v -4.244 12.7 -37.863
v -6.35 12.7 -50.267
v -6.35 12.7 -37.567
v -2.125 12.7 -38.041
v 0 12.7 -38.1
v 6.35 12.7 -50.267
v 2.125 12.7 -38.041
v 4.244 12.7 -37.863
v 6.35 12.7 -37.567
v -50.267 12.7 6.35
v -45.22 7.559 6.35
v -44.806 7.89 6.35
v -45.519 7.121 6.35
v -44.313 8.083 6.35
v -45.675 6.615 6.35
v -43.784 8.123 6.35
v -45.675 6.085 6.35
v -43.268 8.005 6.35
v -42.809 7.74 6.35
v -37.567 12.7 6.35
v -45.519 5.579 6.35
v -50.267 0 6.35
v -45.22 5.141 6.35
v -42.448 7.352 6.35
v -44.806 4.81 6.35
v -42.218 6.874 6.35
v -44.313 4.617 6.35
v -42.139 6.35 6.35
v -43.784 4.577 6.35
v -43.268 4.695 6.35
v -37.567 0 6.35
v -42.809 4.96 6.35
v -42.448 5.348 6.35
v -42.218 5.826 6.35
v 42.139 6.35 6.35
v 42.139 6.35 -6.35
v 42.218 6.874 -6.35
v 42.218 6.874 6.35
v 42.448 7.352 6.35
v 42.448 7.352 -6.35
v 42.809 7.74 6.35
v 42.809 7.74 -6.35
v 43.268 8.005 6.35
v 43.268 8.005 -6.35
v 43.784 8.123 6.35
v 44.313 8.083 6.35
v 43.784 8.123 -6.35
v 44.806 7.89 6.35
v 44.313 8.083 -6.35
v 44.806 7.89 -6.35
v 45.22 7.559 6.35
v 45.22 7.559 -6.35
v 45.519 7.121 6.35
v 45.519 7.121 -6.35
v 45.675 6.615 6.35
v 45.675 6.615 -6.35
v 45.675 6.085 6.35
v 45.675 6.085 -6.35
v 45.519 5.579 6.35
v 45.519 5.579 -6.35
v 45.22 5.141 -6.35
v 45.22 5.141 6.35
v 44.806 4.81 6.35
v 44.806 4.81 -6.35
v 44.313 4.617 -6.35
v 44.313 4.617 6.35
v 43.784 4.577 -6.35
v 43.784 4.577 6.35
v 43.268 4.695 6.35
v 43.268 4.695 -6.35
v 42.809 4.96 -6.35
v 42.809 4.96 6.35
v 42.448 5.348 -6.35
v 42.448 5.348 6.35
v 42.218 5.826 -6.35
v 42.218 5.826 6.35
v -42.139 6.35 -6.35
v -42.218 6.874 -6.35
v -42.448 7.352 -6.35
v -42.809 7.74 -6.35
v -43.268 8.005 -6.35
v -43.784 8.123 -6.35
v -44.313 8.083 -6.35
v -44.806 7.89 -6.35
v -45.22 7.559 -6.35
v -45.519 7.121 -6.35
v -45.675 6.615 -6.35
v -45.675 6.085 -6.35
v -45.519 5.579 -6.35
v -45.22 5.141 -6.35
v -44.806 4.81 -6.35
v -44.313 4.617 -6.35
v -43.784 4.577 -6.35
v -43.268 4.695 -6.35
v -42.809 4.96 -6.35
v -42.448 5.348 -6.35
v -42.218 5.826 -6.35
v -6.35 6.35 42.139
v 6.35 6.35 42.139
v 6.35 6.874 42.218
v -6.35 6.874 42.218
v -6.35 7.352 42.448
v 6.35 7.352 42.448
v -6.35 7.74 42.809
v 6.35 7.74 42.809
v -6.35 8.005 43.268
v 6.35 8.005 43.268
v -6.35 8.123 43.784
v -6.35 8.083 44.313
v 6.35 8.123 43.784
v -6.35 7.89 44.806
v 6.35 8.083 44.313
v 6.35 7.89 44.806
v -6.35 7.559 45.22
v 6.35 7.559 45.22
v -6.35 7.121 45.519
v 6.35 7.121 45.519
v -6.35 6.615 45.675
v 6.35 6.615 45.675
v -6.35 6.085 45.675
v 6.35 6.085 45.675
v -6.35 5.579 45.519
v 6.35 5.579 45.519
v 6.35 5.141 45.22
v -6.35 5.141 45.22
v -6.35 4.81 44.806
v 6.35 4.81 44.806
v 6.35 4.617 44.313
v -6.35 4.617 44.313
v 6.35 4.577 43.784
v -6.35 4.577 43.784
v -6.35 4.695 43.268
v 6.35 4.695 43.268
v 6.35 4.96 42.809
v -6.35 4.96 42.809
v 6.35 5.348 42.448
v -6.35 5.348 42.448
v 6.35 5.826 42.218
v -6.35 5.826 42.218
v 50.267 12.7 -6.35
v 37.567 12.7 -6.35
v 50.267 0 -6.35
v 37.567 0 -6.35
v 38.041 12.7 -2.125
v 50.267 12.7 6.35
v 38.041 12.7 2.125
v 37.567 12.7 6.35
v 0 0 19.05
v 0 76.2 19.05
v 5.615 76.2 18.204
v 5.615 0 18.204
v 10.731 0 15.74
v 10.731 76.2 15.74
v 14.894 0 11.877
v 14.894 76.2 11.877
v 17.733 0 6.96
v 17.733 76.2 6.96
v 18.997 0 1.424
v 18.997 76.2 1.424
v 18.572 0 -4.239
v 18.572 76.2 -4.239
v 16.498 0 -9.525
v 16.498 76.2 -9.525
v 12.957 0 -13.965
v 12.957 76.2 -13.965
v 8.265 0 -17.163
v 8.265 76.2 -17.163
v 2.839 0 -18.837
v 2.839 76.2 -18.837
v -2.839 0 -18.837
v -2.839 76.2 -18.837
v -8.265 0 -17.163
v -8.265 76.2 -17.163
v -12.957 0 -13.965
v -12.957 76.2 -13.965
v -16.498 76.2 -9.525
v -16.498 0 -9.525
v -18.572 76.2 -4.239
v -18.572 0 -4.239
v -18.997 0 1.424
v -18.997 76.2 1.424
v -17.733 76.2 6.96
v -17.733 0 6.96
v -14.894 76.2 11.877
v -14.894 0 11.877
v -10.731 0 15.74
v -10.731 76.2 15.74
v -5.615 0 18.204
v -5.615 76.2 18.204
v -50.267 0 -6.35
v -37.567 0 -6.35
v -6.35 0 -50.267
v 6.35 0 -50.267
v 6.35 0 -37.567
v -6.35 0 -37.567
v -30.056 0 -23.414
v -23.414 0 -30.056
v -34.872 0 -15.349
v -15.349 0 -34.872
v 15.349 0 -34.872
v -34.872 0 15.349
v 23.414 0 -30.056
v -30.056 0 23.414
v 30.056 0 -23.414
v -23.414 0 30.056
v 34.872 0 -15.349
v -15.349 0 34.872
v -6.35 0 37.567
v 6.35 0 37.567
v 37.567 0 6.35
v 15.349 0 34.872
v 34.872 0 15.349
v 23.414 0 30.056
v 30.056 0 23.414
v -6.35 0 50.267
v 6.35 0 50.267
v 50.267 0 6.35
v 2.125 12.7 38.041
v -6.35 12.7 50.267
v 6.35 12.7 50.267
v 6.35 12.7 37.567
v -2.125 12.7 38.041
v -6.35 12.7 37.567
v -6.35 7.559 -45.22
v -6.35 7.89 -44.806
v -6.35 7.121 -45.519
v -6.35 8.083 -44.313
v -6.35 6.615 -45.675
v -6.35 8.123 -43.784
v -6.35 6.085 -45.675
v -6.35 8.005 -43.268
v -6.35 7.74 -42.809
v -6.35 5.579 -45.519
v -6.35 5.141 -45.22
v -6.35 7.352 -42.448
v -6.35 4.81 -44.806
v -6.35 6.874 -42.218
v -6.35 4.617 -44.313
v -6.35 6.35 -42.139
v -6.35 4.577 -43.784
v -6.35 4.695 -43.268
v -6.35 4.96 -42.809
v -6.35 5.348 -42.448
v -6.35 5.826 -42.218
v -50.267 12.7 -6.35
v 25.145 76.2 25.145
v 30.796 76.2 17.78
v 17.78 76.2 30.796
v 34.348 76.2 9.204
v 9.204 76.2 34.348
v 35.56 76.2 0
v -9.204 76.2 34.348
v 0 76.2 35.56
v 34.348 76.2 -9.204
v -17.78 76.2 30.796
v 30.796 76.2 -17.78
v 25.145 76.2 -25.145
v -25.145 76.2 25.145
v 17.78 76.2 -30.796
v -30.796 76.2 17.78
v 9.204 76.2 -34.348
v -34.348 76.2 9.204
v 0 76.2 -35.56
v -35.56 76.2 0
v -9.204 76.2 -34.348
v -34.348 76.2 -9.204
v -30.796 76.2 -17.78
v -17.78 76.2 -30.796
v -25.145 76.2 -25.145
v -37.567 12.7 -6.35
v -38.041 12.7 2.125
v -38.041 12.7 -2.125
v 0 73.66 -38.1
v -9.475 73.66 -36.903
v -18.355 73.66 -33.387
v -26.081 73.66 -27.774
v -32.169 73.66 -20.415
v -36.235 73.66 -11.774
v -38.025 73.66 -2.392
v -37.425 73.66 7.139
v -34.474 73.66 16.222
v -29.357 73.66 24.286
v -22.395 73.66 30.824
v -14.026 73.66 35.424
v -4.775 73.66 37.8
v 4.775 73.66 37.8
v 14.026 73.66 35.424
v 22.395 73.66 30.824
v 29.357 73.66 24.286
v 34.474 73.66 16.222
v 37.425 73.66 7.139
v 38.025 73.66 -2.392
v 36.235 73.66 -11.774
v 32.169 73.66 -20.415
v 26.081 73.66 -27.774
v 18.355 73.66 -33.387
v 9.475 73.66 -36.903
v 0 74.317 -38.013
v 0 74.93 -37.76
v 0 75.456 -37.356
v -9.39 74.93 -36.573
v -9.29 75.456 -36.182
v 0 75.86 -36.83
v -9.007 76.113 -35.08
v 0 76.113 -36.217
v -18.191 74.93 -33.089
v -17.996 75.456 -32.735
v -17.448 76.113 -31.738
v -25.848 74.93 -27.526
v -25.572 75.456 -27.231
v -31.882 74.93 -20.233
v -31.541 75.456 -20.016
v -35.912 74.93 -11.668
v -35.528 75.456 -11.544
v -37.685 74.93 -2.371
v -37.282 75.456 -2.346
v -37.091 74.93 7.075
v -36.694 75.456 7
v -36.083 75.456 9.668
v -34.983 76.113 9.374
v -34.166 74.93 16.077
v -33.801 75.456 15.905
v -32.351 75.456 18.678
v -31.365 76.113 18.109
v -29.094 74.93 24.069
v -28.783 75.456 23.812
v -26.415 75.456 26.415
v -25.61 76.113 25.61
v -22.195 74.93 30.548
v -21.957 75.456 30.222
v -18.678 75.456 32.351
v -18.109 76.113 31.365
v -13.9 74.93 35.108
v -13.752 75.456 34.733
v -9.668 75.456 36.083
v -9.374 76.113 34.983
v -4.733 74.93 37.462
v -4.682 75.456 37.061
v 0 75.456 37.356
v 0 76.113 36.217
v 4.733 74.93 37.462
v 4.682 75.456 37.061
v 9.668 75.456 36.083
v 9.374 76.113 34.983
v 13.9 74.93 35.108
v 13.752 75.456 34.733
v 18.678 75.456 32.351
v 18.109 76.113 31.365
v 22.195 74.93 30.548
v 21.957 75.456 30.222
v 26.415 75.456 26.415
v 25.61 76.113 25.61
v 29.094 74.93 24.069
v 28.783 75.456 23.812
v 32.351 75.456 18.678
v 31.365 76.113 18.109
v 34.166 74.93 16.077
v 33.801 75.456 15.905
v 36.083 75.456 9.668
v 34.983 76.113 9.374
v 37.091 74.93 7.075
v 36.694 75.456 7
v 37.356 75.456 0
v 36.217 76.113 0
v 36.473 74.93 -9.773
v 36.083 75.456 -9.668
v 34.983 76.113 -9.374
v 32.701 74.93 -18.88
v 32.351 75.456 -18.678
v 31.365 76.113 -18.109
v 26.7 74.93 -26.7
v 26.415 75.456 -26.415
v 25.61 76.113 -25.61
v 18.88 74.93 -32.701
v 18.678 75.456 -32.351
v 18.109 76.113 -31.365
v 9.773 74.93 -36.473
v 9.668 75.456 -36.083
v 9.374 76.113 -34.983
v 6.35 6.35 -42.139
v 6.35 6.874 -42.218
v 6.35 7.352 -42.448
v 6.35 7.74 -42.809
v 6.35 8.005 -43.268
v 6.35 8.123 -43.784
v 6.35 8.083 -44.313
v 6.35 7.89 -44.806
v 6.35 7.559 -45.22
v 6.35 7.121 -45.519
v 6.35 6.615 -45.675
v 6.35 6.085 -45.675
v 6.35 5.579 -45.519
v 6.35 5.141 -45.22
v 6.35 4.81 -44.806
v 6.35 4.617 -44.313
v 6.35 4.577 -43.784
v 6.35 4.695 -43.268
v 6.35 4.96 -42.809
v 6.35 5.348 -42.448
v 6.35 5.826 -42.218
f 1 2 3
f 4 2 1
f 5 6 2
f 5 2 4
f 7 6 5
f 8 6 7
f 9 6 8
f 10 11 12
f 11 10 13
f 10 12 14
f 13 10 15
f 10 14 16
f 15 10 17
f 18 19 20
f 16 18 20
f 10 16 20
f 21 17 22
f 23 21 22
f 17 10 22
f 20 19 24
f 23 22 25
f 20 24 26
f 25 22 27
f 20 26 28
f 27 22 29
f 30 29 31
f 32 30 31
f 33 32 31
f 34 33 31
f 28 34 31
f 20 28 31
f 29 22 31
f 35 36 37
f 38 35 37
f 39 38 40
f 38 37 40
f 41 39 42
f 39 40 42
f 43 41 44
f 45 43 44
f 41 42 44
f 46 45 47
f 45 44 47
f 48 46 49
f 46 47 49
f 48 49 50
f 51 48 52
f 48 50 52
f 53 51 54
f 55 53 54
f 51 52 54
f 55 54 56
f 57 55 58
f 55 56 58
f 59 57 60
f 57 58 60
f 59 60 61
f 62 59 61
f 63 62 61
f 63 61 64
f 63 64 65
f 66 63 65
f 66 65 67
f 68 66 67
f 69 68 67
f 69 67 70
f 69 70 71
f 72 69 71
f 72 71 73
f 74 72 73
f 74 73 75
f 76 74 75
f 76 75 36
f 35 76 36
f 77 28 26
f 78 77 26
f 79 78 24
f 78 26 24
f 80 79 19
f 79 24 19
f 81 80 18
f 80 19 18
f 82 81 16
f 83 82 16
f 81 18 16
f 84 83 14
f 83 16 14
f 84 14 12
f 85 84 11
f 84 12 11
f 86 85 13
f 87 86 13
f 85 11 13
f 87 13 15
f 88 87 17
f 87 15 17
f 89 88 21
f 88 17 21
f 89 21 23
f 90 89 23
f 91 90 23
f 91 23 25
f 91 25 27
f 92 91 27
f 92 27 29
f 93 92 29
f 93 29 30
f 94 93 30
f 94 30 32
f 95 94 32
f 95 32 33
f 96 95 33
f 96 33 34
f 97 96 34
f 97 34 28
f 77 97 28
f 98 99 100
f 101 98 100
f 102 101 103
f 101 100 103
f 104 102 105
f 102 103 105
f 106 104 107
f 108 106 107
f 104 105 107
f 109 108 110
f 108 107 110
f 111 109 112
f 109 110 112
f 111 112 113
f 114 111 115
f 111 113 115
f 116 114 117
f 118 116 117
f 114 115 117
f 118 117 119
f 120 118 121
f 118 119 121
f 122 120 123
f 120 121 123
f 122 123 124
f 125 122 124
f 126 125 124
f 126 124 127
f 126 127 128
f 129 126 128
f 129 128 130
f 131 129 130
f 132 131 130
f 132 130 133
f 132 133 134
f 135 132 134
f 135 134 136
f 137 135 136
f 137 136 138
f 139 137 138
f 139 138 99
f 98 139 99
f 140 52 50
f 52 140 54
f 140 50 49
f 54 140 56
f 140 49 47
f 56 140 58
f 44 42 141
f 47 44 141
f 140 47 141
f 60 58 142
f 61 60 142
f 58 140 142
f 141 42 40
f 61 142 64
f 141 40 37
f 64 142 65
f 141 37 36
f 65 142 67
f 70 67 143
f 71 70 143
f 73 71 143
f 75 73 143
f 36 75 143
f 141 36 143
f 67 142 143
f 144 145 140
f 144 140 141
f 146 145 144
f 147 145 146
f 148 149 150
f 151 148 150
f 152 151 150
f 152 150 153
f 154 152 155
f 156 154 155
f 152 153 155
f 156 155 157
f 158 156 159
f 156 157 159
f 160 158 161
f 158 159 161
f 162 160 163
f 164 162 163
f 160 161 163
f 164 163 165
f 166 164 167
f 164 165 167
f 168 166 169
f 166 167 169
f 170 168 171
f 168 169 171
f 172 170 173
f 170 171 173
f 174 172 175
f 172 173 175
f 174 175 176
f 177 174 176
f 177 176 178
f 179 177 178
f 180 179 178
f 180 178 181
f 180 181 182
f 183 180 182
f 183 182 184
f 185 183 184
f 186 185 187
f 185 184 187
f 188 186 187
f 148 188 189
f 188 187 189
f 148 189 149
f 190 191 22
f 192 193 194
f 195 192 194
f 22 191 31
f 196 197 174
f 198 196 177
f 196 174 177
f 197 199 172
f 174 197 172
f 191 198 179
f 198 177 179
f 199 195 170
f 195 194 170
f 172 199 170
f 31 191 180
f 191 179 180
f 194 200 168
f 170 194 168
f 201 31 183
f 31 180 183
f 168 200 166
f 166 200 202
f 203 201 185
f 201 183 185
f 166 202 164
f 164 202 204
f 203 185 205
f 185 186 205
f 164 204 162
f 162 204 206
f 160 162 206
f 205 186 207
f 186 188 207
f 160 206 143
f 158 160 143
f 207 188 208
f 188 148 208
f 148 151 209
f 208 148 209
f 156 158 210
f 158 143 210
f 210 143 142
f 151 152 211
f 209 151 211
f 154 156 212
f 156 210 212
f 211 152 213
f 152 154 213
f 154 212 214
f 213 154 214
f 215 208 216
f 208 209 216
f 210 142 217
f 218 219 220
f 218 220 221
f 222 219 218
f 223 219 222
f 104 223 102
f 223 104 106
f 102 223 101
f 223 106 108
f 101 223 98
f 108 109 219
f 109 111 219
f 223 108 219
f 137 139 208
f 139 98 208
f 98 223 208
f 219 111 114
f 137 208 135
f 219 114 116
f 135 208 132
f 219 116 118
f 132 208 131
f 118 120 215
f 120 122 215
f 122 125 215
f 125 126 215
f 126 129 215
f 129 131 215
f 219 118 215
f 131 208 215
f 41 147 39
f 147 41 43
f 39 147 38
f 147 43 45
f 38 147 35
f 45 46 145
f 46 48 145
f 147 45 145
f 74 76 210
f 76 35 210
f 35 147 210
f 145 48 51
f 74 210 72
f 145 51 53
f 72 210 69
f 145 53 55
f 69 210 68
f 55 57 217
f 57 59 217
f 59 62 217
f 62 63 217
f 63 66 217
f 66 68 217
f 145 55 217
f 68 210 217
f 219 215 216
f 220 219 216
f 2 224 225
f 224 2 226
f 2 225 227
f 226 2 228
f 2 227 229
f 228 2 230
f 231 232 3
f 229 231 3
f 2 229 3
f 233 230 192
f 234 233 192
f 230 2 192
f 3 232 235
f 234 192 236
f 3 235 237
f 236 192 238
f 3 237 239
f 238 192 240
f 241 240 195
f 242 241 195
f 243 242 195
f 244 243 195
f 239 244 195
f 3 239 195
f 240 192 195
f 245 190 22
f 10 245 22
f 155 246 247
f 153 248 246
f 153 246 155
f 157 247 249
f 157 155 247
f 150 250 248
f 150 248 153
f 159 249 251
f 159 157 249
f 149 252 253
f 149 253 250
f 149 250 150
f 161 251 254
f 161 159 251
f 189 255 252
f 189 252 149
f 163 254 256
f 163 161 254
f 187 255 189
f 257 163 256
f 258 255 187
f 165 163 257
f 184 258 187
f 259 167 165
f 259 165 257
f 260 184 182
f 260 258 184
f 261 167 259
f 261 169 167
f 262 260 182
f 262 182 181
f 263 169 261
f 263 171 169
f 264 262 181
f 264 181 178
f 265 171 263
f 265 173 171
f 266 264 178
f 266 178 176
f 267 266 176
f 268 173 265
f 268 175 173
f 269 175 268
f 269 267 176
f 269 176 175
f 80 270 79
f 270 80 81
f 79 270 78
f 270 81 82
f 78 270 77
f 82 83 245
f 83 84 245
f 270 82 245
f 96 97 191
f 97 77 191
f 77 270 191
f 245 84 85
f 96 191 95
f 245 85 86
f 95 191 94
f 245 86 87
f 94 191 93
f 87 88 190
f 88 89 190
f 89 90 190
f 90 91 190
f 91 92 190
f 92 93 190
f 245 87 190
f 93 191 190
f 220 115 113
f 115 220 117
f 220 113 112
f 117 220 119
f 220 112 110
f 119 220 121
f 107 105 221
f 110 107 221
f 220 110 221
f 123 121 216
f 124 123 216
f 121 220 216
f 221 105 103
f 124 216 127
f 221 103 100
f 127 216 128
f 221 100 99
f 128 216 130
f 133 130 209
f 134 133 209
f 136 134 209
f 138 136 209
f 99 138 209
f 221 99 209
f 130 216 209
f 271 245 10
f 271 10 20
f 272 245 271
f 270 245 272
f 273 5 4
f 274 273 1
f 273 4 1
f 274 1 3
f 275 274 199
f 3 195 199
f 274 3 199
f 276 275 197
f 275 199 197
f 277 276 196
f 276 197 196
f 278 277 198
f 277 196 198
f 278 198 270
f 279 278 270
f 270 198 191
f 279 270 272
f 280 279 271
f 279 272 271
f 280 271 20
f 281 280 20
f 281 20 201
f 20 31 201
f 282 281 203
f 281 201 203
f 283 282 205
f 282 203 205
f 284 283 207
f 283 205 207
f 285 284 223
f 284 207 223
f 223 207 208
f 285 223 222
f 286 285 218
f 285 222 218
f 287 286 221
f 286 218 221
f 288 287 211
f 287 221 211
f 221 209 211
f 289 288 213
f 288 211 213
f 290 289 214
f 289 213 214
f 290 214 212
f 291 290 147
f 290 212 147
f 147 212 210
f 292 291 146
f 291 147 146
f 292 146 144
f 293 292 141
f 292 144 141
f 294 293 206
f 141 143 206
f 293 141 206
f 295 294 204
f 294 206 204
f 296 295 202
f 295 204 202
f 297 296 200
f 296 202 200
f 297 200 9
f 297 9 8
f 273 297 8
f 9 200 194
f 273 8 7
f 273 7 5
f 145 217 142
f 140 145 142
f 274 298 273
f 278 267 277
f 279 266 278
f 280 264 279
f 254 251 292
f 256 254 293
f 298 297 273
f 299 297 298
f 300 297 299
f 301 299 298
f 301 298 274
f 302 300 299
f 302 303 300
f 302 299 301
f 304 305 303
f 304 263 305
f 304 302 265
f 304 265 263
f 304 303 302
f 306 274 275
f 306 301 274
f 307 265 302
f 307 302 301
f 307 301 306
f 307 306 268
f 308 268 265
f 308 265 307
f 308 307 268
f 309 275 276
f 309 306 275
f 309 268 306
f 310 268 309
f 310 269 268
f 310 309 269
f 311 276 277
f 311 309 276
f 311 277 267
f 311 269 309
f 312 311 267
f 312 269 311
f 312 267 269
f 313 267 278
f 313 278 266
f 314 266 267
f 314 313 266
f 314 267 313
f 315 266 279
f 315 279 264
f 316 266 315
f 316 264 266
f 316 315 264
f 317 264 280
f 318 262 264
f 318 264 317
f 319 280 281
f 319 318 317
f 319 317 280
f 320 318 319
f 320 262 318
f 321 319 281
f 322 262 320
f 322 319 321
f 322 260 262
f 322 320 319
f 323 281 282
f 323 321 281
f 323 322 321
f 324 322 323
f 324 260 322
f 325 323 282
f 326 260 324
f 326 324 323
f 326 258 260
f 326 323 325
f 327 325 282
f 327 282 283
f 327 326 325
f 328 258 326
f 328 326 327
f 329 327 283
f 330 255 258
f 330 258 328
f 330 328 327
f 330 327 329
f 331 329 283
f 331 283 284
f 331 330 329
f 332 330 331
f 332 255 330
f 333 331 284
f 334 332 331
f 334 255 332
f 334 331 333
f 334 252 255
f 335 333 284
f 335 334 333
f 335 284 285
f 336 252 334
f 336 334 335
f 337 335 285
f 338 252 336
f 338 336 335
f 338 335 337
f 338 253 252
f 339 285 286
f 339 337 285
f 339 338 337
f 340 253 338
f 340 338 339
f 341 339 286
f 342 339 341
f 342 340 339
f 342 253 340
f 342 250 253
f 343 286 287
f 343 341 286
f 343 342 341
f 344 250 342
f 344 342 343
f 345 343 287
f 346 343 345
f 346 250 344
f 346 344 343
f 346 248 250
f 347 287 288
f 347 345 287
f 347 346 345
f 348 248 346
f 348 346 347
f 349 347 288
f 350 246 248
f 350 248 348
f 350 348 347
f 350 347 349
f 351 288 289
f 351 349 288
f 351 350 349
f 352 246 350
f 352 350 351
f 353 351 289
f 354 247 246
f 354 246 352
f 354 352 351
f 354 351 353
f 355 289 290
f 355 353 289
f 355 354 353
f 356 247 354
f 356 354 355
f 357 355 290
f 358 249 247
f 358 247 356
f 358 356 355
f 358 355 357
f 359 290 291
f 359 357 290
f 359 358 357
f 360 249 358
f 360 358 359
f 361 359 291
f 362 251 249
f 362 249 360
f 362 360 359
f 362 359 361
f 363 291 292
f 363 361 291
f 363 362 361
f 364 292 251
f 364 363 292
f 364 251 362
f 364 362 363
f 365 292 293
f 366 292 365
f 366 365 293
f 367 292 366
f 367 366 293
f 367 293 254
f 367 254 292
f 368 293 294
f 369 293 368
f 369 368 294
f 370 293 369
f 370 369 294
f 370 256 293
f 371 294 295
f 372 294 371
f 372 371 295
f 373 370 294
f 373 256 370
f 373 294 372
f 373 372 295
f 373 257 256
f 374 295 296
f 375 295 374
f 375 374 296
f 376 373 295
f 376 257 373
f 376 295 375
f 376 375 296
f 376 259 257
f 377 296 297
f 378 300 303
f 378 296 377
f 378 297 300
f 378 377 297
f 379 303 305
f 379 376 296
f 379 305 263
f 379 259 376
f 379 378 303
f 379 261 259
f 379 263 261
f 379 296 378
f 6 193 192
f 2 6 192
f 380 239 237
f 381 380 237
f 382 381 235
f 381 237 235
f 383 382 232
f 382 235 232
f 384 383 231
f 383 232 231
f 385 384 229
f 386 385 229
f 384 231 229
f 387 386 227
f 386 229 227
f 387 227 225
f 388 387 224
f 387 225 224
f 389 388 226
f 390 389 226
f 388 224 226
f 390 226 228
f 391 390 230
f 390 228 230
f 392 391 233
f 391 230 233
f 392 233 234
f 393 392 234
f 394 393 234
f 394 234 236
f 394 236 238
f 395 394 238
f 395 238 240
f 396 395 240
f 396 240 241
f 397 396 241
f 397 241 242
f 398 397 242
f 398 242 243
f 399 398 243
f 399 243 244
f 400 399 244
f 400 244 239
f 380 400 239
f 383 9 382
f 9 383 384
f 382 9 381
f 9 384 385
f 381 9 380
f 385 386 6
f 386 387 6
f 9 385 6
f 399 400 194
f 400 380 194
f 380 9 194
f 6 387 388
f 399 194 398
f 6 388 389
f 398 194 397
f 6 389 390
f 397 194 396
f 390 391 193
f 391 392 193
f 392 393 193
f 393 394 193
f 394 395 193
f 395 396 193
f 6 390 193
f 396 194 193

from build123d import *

# Parameters (mm, degrees)
SKETCH2_R           = 38.1
BOSS_EXTRUDE1_DEPTH = 76.2
SKETCH3_R           = 19.05
CUT_EXTRUDE1_DEPTH  = 76.2
FILLET1_R           = 2.54
BOSS_EXTRUDE2_DEPTH = 12.7
SKETCH5_R           = 1.778
CUT_EXTRUDE2_DEPTH  = 25.4
CIRPATTERN2_COUNT   = 4


with BuildPart() as part:
    # Sketch2 → Boss-Extrude1 (new body)
    with BuildSketch(Plane(origin=(0, 0, 0), x_dir=(1, 0, 0), z_dir=(0, 1, 0))):
        with Locations(Location((0, 0, 0), (0, 0, 90))):
            Circle(SKETCH2_R)
    extrude(amount=BOSS_EXTRUDE1_DEPTH)

    # Sketch3 → Cut-Extrude1 (cut)
    with BuildSketch(Plane(origin=(0, 76.2, 0), x_dir=(1, 0, 0), z_dir=(0, 1, 0))):
        with Locations(Location((0, 0, 0), (0, 0, 270))):
            Circle(SKETCH3_R)
    extrude(amount=-CUT_EXTRUDE1_DEPTH, mode=Mode.SUBTRACT)

    # Fillet1
    fillet1_edges = [part.edges().sort_by_distance(p)[0] for p in [
        (0, 76.2, 38.1),
    ]]
    fillet(fillet1_edges, radius=FILLET1_R)

    # Sketch4 → Boss-Extrude2 (add)
    with BuildSketch(Plane(origin=(0, 0, 0), x_dir=(1, 0, 0), z_dir=(0, 1, 0))):
        with BuildLine():
            Line((-37.567106623, 6.35), (-50.267106623, 6.35))
            Line((-50.267106623, 6.35), (-50.267106623, -6.35))
            Line((-50.267106623, -6.35), (-37.567106623, -6.35))
            ThreePointArc((-37.567106623, -6.35), (-38.1, 0), (-37.567106623, 6.35))
        make_face()
    boss_extrude2 = extrude(amount=BOSS_EXTRUDE2_DEPTH)

    # Sketch5 → Cut-Extrude2 (cut)
    with BuildSketch(Plane.XY.offset(6.35)):
        with Locations((-43.917106623, 6.35)):
            Circle(SKETCH5_R)
    cut_extrude2 = extrude(amount=-CUT_EXTRUDE2_DEPTH, mode=Mode.SUBTRACT)

    # CirPattern2: Boss-Extrude2, Cut-Extrude2 ×4 about axis
    cirpattern2_axis = Axis((0, 0, 0), (0, 1, 0))
    add([boss_extrude2.rotate(cirpattern2_axis, i * 360 / CIRPATTERN2_COUNT) for i in range(1, CIRPATTERN2_COUNT)])
    add([cut_extrude2.rotate(cirpattern2_axis, i * 360 / CIRPATTERN2_COUNT) for i in range(1, CIRPATTERN2_COUNT)], mode=Mode.SUBTRACT)


solid = part.part
